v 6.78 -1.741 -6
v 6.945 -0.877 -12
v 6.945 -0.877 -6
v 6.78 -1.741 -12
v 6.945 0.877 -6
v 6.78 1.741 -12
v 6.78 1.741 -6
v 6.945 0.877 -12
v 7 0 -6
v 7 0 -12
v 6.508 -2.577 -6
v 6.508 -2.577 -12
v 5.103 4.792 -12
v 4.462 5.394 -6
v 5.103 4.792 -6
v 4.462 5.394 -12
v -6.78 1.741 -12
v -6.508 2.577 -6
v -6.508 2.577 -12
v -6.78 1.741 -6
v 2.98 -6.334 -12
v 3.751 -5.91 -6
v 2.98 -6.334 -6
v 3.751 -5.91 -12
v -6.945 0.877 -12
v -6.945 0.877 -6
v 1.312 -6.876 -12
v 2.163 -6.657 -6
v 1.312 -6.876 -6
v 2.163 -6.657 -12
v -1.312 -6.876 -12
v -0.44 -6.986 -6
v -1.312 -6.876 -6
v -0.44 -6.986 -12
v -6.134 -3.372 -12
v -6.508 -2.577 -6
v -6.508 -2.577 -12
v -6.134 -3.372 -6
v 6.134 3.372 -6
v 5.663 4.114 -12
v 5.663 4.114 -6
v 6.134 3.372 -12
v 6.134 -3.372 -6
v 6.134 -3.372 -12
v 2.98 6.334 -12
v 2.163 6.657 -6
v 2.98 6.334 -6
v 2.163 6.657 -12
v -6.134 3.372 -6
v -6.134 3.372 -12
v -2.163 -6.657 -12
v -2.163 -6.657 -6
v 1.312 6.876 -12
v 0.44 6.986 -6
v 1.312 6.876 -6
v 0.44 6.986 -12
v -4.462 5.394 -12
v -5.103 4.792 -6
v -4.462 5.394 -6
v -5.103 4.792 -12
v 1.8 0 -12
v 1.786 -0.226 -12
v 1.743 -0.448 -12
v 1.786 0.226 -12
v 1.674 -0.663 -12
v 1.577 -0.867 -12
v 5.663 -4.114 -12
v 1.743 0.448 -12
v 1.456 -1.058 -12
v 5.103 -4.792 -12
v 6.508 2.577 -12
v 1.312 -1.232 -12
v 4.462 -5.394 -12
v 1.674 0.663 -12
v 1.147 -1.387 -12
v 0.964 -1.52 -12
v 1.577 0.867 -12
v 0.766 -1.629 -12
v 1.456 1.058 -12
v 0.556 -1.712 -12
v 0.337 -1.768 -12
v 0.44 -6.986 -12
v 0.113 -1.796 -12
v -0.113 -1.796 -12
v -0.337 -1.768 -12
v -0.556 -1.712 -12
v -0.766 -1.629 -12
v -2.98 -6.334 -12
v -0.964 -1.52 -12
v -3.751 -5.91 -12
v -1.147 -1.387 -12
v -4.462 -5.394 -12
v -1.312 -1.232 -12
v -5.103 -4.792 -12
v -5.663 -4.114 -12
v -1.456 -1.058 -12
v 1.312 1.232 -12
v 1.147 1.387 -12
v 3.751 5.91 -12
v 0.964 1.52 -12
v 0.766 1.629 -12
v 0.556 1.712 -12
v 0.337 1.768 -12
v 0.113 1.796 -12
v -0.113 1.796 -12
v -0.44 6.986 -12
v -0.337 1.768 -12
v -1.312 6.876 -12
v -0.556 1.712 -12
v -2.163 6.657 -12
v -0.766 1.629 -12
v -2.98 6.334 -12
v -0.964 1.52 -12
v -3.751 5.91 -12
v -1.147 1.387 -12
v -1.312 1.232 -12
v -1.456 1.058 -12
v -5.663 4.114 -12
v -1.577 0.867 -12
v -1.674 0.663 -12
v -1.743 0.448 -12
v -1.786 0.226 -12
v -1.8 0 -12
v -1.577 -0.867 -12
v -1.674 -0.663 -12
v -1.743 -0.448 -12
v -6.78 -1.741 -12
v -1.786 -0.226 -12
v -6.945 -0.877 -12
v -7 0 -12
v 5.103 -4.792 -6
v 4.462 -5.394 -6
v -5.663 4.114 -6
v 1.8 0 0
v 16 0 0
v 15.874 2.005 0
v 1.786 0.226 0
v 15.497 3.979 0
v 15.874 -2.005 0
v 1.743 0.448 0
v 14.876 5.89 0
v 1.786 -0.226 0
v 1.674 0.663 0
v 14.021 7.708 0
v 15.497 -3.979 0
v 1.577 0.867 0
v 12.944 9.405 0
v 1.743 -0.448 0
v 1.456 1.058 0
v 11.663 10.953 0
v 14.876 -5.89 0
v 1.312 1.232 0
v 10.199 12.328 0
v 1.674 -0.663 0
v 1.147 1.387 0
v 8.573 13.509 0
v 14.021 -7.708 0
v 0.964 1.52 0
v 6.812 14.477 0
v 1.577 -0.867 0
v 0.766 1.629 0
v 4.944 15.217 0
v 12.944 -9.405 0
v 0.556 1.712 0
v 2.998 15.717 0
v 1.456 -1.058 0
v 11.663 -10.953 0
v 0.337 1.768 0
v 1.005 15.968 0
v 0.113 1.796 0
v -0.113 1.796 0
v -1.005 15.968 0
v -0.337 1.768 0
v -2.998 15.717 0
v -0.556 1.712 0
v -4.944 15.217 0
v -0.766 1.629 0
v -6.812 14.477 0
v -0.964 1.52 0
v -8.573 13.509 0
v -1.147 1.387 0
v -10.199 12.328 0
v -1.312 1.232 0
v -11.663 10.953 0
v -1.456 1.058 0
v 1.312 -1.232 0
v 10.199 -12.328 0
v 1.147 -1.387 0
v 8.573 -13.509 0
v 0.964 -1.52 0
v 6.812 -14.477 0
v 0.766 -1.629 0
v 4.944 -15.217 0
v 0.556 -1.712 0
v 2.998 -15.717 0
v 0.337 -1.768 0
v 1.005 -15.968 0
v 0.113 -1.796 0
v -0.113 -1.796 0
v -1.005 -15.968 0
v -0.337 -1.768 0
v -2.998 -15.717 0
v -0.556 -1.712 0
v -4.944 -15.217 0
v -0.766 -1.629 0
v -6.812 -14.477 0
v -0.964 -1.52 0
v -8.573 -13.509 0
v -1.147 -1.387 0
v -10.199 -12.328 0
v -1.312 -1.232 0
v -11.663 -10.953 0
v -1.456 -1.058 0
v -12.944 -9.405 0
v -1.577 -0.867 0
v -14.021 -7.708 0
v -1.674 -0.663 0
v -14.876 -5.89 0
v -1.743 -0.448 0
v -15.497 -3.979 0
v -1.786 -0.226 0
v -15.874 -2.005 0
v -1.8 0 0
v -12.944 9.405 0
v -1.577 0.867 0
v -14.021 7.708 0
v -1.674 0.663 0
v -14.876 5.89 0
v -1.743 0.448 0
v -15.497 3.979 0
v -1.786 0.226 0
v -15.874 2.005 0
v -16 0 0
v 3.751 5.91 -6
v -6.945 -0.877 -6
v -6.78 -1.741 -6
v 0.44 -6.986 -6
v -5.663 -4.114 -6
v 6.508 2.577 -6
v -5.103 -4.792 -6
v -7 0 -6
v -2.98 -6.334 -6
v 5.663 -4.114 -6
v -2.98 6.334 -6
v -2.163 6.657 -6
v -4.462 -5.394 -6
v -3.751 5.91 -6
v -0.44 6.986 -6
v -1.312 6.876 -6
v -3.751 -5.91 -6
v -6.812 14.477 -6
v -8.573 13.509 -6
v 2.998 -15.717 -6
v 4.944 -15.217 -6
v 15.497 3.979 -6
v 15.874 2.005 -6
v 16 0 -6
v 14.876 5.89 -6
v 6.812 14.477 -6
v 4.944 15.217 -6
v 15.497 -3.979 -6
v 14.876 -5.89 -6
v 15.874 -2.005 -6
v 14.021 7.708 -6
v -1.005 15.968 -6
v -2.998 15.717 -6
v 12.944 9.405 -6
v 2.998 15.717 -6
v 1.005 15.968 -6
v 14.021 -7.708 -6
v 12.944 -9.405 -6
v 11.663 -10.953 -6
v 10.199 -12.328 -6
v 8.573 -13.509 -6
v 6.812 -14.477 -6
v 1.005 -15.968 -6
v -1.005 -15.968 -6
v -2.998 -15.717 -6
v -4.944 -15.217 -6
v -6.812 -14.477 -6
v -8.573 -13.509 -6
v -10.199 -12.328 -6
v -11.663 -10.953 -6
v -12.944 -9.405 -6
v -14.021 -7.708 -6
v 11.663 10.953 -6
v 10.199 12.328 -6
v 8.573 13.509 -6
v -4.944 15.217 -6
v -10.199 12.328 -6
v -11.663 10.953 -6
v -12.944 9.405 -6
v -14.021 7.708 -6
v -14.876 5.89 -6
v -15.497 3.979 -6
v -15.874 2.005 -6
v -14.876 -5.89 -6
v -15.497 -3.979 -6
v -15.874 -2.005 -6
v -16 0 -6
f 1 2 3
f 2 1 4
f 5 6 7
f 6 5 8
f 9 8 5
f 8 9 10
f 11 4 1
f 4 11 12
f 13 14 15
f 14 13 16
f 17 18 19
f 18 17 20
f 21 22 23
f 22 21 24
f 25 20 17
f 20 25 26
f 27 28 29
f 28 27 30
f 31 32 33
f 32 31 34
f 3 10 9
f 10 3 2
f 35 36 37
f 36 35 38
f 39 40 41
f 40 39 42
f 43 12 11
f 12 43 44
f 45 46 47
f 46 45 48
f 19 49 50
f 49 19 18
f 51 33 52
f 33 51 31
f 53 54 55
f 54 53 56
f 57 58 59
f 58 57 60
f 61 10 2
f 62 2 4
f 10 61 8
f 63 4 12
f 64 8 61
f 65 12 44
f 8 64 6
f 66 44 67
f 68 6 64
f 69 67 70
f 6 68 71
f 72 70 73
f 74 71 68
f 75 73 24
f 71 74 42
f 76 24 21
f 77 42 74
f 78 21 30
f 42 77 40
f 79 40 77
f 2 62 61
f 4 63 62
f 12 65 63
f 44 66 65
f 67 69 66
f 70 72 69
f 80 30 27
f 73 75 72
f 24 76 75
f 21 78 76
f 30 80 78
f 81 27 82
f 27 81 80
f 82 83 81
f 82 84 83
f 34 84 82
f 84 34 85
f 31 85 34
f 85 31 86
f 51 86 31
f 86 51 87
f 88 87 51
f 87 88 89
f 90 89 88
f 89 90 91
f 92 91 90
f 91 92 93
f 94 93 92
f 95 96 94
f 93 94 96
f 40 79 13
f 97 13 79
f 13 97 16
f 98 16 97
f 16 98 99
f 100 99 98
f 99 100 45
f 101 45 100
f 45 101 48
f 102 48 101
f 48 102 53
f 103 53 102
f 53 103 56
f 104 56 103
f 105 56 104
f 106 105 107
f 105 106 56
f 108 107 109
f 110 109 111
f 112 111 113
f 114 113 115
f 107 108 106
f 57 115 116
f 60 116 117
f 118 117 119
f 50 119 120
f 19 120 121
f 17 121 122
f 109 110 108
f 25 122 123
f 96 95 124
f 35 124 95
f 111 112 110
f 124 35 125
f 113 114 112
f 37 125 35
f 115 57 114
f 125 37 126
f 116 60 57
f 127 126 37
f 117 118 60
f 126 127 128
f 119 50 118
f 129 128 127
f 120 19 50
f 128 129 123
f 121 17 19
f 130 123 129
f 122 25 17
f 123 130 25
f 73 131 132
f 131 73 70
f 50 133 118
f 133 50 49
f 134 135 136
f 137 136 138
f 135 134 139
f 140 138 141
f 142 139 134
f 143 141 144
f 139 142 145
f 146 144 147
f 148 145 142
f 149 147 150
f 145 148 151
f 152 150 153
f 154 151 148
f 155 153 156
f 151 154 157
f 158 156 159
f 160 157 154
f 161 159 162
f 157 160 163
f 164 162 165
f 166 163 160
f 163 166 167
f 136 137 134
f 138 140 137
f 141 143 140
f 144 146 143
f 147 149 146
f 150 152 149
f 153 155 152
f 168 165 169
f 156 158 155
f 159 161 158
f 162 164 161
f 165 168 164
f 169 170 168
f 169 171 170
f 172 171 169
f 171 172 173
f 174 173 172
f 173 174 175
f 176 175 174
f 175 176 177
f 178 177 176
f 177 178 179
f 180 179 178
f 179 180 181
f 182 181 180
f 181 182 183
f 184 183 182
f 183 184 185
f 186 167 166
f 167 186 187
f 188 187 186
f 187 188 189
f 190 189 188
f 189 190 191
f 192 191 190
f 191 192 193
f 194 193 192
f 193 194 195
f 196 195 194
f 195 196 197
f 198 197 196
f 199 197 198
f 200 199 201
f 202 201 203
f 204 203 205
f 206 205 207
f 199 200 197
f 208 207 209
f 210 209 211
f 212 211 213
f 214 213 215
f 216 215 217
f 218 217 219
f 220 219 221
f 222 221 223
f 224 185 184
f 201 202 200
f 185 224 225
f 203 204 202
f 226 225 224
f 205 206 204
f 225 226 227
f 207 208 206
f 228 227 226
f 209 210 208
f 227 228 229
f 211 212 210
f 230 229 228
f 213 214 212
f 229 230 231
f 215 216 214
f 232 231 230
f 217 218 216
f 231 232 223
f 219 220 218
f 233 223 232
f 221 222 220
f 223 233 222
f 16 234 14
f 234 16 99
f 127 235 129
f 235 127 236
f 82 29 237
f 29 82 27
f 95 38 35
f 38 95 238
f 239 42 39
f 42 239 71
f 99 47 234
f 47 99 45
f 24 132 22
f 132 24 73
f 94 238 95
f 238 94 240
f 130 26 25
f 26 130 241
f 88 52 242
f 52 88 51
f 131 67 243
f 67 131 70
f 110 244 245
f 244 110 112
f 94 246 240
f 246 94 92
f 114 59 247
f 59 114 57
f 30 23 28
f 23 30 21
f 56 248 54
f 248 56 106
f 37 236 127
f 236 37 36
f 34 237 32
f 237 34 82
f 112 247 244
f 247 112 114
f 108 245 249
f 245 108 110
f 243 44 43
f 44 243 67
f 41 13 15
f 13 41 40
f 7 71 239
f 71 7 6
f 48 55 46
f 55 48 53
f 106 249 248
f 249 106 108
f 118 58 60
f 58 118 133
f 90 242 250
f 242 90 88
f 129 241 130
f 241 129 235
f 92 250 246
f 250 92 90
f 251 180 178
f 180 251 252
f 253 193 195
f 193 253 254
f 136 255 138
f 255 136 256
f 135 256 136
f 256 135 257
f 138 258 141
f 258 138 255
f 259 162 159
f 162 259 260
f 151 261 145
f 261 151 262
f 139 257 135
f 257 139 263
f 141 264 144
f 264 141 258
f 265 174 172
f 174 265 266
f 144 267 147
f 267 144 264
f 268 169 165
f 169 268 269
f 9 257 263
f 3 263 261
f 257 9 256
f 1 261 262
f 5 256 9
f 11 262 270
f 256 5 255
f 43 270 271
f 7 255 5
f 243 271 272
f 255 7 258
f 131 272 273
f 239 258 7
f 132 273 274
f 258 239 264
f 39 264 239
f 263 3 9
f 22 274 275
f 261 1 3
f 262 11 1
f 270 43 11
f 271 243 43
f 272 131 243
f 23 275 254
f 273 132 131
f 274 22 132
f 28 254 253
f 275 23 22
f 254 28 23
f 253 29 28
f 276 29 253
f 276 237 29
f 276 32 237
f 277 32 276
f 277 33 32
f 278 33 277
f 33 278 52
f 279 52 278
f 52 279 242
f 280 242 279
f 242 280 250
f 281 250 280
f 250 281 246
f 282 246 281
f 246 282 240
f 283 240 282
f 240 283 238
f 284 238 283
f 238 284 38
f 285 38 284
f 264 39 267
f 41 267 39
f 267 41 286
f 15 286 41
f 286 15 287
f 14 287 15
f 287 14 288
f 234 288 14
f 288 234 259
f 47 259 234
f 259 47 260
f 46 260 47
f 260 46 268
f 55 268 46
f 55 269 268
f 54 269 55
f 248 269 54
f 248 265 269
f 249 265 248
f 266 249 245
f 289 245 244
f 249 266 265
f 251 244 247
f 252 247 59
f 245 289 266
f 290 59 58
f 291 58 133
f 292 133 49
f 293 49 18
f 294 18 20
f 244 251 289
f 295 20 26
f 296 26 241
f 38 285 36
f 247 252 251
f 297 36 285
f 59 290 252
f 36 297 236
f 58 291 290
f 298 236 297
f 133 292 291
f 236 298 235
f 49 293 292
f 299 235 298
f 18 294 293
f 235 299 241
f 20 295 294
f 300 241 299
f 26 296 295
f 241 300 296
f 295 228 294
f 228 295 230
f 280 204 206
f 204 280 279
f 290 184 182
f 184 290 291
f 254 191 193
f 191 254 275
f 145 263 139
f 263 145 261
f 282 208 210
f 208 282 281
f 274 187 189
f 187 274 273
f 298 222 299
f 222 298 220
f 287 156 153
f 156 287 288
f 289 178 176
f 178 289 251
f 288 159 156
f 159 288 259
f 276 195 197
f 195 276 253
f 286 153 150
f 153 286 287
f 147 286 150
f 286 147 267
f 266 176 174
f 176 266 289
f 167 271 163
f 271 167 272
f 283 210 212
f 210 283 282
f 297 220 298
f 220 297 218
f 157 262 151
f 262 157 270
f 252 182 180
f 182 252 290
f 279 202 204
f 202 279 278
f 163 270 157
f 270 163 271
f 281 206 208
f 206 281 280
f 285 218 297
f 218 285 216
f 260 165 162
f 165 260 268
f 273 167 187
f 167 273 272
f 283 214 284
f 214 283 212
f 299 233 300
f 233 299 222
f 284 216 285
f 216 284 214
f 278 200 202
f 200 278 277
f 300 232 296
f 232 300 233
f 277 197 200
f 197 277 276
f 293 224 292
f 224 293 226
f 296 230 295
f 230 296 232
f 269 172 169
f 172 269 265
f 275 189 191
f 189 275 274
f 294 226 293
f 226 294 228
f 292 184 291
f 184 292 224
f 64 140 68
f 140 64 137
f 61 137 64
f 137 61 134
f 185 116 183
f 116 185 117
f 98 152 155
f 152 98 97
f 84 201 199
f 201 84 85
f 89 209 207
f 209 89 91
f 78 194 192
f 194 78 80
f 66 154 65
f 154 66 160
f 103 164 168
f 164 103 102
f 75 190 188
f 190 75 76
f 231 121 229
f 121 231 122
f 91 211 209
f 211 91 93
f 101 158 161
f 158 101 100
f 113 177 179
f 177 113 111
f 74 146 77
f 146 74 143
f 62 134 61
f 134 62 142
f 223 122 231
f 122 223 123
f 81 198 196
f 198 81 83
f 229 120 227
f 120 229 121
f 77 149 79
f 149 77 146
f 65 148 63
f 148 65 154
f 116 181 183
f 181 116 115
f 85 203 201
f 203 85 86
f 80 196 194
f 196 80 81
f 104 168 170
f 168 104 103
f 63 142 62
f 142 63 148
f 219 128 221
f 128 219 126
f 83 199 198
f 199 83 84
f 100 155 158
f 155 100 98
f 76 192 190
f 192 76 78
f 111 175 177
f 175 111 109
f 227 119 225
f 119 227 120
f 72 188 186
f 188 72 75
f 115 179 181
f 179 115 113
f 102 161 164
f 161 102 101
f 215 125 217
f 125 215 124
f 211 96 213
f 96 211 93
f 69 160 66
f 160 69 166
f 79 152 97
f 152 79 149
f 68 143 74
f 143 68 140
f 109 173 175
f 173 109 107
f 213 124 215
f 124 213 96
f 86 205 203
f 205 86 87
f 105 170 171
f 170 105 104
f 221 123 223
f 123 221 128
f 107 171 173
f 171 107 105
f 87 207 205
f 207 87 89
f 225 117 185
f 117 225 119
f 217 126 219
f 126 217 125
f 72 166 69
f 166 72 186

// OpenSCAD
$fn = 50;


difference() {
	union() {
		translate(v = [0, 0, -12.0000000000]) {
			cylinder(h = 12, r = 7.0000000000);
		}
		translate(v = [0, 0, -6.0000000000]) {
			cylinder(h = 6, r = 16.0000000000);
		}
	}
	union() {
		#translate(v = [0, 0, -12]) {
			cylinder(h = 12, r = 1.8000000000);
		}
	}
}
